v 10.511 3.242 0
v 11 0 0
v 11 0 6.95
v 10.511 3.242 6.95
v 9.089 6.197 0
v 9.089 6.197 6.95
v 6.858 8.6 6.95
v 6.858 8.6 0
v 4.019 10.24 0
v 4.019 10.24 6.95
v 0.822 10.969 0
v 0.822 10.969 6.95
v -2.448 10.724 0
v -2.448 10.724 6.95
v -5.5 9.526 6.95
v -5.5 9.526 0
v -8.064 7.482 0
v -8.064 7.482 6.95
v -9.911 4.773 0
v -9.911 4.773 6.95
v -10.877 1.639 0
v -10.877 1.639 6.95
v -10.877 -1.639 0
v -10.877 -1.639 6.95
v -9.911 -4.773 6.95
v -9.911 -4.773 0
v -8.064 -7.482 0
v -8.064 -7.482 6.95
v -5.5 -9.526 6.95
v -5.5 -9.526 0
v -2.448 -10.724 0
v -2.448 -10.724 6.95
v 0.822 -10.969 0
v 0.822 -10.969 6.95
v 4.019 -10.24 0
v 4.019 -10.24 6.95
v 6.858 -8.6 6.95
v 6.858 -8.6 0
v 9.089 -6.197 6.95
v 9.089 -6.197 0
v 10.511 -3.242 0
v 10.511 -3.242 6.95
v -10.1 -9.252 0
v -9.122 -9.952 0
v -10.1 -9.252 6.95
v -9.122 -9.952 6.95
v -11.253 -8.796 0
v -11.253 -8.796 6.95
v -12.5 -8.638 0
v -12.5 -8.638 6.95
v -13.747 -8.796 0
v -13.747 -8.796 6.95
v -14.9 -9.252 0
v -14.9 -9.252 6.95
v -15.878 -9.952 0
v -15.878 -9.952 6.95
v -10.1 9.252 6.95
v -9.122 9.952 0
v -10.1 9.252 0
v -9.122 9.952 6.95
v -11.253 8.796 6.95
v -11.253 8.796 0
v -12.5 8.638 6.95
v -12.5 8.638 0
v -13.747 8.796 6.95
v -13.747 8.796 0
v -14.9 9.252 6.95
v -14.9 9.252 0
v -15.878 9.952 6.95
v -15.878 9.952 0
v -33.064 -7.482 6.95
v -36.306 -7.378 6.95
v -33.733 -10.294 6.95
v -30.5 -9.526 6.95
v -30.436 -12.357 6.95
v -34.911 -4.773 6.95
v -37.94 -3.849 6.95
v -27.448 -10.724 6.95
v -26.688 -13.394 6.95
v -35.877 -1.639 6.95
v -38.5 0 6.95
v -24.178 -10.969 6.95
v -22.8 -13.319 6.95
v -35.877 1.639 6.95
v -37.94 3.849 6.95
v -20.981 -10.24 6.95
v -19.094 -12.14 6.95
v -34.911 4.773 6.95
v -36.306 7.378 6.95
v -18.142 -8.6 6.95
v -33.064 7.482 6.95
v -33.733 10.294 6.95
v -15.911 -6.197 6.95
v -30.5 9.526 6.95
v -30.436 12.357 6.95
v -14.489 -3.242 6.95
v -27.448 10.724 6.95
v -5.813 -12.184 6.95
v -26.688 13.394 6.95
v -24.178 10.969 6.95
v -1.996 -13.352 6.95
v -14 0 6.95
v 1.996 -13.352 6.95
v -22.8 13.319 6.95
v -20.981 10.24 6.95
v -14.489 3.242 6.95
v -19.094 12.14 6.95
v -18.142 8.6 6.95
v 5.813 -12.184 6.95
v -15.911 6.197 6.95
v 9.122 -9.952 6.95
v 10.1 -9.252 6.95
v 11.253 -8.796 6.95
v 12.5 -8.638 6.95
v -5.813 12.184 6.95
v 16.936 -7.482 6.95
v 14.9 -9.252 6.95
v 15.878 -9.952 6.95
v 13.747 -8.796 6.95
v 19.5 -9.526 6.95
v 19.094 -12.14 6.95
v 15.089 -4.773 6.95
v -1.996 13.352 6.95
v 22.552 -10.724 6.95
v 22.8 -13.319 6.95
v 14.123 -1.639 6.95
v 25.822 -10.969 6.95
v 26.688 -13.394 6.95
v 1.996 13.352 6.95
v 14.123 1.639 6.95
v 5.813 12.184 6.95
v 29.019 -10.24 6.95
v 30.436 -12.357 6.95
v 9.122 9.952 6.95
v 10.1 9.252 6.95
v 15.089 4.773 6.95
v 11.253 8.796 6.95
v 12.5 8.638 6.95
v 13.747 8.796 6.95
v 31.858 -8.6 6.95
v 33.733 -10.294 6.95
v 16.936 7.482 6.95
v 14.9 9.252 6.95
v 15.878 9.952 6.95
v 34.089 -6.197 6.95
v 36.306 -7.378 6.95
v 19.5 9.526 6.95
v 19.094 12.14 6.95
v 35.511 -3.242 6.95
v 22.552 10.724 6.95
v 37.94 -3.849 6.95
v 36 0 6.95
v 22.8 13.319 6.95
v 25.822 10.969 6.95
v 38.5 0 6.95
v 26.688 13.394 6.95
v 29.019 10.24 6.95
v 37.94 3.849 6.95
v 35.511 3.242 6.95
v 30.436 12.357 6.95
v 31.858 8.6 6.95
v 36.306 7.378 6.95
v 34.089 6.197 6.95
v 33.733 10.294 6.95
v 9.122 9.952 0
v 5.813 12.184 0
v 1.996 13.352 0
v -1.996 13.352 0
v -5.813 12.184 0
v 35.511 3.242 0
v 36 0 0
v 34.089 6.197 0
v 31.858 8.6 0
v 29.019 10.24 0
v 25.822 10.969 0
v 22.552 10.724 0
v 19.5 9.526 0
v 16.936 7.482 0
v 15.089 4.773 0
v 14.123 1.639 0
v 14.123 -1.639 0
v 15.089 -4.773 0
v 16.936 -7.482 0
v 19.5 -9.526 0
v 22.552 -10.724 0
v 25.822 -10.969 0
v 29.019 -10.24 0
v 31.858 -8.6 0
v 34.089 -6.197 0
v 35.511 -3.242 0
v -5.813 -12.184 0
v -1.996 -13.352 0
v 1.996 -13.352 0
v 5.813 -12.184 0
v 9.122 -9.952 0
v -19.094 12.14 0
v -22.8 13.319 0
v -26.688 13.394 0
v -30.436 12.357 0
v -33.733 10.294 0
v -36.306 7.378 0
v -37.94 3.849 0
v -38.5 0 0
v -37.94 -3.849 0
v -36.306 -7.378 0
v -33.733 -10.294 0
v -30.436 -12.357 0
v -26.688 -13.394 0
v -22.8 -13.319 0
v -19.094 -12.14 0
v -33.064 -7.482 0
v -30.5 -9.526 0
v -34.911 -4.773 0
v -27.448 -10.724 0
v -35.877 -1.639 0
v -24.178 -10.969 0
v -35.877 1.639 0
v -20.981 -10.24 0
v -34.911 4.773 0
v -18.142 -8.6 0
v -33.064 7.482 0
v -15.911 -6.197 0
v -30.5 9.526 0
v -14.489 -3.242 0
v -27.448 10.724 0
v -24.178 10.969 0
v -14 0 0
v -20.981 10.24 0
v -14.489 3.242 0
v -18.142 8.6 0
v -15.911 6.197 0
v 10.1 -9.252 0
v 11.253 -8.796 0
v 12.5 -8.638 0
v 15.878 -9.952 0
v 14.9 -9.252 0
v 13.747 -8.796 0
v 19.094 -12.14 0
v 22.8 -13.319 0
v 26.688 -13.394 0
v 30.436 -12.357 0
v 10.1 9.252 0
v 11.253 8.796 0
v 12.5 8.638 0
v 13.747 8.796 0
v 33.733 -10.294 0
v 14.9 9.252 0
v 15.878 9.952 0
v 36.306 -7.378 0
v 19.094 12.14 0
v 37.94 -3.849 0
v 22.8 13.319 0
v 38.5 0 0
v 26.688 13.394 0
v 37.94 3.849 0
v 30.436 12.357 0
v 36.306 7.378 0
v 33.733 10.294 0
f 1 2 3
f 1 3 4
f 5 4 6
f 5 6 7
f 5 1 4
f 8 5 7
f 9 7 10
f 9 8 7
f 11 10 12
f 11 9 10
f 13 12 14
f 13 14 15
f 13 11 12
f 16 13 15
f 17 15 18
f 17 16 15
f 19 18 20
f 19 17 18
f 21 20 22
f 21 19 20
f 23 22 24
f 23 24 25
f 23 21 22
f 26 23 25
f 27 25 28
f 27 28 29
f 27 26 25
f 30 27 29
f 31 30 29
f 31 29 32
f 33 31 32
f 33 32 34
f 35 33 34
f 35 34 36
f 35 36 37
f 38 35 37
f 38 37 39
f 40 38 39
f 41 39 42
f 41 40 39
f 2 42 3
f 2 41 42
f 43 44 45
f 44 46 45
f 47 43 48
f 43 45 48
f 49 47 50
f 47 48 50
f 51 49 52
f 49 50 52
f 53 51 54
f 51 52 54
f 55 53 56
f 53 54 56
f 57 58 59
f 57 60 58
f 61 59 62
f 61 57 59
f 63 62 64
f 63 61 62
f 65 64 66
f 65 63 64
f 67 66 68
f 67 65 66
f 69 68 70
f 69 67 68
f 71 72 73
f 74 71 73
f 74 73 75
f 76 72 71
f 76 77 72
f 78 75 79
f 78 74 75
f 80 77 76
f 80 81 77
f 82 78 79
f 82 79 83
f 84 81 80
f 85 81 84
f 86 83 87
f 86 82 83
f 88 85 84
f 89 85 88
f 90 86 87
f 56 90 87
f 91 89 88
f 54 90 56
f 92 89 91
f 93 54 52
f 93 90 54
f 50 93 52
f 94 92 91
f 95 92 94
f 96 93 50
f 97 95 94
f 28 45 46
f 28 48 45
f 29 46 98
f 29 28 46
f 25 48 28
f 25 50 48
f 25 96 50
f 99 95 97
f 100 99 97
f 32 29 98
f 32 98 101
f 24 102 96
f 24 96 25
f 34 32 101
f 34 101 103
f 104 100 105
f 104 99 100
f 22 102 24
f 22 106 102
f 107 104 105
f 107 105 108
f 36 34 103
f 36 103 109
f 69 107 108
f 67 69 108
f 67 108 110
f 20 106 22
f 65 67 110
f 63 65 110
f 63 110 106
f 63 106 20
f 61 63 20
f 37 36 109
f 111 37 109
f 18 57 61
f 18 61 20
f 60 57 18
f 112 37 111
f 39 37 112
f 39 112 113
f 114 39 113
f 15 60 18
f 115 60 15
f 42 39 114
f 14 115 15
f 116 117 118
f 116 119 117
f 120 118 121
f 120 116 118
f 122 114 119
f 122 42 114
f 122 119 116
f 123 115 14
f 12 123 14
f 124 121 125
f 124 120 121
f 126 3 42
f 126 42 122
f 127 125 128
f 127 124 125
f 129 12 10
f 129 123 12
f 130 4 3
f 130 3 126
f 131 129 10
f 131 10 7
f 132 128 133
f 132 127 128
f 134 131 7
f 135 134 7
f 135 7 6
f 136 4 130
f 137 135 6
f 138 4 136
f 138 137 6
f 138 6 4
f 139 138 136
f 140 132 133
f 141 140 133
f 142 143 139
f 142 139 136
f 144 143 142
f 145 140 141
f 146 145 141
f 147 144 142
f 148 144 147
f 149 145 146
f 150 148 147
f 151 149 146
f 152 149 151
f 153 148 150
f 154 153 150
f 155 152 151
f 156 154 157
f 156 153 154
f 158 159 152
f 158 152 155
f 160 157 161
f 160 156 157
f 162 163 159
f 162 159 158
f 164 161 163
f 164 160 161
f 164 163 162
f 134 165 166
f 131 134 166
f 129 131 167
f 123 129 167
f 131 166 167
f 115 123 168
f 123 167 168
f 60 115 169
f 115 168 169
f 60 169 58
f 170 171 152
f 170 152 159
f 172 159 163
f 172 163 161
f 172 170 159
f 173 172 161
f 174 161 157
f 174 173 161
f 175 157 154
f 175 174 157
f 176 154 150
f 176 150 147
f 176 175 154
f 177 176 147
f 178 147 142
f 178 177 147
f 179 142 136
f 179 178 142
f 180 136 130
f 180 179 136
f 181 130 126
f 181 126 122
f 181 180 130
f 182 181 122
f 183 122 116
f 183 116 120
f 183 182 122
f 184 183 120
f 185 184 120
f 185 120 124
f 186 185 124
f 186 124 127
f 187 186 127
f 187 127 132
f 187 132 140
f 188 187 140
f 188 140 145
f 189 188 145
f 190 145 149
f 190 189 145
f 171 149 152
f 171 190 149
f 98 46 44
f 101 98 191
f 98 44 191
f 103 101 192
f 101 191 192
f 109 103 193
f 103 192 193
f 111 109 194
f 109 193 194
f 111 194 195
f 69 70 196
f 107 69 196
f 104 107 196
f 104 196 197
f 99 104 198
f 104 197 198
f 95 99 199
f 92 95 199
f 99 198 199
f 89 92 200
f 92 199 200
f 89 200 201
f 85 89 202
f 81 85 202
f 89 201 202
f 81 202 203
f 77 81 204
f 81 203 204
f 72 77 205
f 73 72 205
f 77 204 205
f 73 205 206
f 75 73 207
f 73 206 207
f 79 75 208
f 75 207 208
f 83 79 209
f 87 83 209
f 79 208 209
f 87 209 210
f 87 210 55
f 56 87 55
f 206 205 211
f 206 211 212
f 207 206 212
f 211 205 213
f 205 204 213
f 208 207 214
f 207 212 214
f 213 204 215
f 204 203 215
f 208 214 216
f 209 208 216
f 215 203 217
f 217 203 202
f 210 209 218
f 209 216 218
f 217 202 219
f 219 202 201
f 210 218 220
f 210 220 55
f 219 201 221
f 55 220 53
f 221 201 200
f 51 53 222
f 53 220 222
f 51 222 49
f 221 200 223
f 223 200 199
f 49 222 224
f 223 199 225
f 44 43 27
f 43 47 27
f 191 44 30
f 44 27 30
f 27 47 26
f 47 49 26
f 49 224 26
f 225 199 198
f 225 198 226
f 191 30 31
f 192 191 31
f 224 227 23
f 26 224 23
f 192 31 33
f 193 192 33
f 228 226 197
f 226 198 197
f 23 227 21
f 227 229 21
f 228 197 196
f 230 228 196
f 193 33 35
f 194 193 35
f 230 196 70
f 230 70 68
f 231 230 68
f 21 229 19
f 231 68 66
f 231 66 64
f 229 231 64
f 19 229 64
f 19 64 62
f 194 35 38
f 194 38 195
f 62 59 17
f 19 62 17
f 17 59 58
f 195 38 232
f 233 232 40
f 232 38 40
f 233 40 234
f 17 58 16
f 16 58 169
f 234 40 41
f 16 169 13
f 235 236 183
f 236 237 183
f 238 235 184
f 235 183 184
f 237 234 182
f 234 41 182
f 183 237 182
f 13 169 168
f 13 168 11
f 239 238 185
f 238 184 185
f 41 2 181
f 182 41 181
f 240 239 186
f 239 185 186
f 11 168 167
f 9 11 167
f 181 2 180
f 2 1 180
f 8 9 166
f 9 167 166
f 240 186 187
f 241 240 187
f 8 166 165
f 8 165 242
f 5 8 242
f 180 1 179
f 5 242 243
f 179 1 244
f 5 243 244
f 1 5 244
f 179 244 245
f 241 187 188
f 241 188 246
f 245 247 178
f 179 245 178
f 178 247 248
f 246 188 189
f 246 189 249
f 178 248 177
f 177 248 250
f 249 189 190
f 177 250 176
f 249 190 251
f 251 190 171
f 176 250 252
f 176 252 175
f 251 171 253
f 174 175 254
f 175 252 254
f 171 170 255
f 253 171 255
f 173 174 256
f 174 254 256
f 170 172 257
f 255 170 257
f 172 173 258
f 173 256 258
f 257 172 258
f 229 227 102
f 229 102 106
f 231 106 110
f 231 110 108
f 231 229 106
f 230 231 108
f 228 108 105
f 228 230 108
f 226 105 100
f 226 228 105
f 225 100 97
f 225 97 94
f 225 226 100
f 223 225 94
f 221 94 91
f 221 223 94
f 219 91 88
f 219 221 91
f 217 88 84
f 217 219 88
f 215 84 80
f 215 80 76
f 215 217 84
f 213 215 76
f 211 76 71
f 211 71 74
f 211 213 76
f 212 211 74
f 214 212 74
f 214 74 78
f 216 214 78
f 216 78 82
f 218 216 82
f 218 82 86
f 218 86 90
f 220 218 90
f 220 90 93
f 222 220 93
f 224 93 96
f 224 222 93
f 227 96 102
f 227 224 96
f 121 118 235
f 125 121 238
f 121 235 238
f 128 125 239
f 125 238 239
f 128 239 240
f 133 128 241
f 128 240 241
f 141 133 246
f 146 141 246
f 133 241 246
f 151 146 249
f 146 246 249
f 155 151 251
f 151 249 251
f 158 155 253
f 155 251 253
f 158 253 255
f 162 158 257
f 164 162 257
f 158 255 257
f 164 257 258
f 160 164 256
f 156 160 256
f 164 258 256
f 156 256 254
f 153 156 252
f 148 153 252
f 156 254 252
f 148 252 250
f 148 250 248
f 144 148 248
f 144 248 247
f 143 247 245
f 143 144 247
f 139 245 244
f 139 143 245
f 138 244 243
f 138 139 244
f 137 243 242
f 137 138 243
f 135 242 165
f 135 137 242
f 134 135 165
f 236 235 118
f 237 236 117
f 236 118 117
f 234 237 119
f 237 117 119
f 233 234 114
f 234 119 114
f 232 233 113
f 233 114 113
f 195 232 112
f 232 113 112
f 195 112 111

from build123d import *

# Parameters (mm, degrees)
F0_R     = 11
F1_DEPTH = 6.95
F2_R     = 5


with BuildPart() as f1:
    # F0 (on Top) → F1 (new body)
    with BuildSketch(Plane.XY):
        with BuildLine():
            ThreePointArc((12.5, -5.09902), (38.5, 0), (12.5, 5.09902))
            ThreePointArc((12.5, 5.09902), (0, 13.5), (-12.5, 5.09902))
            ThreePointArc((-12.5, 5.09902), (-38.5, 0), (-12.5, -5.09902))
            ThreePointArc((-12.5, -5.09902), (0, -13.5), (12.5, -5.09902))
        make_face()
        with Locations((-25, 0)):
            Circle(F0_R, mode=Mode.SUBTRACT)
        Circle(F0_R, mode=Mode.SUBTRACT)
        with Locations((25, 0)):
            Circle(F0_R, mode=Mode.SUBTRACT)
    extrude(amount=F1_DEPTH)

    # F2
    f2_edges = [f1.edges().sort_by_distance(p)[0] for p in [
        (-12.5, -5.09902, 3.475),
        (12.5, -5.09902, 3.475),
        (12.5, 5.09902, 3.475),
        (-12.5, 5.09902, 3.475),
    ]]
    fillet(f2_edges, radius=F2_R)


solid = f1.part
